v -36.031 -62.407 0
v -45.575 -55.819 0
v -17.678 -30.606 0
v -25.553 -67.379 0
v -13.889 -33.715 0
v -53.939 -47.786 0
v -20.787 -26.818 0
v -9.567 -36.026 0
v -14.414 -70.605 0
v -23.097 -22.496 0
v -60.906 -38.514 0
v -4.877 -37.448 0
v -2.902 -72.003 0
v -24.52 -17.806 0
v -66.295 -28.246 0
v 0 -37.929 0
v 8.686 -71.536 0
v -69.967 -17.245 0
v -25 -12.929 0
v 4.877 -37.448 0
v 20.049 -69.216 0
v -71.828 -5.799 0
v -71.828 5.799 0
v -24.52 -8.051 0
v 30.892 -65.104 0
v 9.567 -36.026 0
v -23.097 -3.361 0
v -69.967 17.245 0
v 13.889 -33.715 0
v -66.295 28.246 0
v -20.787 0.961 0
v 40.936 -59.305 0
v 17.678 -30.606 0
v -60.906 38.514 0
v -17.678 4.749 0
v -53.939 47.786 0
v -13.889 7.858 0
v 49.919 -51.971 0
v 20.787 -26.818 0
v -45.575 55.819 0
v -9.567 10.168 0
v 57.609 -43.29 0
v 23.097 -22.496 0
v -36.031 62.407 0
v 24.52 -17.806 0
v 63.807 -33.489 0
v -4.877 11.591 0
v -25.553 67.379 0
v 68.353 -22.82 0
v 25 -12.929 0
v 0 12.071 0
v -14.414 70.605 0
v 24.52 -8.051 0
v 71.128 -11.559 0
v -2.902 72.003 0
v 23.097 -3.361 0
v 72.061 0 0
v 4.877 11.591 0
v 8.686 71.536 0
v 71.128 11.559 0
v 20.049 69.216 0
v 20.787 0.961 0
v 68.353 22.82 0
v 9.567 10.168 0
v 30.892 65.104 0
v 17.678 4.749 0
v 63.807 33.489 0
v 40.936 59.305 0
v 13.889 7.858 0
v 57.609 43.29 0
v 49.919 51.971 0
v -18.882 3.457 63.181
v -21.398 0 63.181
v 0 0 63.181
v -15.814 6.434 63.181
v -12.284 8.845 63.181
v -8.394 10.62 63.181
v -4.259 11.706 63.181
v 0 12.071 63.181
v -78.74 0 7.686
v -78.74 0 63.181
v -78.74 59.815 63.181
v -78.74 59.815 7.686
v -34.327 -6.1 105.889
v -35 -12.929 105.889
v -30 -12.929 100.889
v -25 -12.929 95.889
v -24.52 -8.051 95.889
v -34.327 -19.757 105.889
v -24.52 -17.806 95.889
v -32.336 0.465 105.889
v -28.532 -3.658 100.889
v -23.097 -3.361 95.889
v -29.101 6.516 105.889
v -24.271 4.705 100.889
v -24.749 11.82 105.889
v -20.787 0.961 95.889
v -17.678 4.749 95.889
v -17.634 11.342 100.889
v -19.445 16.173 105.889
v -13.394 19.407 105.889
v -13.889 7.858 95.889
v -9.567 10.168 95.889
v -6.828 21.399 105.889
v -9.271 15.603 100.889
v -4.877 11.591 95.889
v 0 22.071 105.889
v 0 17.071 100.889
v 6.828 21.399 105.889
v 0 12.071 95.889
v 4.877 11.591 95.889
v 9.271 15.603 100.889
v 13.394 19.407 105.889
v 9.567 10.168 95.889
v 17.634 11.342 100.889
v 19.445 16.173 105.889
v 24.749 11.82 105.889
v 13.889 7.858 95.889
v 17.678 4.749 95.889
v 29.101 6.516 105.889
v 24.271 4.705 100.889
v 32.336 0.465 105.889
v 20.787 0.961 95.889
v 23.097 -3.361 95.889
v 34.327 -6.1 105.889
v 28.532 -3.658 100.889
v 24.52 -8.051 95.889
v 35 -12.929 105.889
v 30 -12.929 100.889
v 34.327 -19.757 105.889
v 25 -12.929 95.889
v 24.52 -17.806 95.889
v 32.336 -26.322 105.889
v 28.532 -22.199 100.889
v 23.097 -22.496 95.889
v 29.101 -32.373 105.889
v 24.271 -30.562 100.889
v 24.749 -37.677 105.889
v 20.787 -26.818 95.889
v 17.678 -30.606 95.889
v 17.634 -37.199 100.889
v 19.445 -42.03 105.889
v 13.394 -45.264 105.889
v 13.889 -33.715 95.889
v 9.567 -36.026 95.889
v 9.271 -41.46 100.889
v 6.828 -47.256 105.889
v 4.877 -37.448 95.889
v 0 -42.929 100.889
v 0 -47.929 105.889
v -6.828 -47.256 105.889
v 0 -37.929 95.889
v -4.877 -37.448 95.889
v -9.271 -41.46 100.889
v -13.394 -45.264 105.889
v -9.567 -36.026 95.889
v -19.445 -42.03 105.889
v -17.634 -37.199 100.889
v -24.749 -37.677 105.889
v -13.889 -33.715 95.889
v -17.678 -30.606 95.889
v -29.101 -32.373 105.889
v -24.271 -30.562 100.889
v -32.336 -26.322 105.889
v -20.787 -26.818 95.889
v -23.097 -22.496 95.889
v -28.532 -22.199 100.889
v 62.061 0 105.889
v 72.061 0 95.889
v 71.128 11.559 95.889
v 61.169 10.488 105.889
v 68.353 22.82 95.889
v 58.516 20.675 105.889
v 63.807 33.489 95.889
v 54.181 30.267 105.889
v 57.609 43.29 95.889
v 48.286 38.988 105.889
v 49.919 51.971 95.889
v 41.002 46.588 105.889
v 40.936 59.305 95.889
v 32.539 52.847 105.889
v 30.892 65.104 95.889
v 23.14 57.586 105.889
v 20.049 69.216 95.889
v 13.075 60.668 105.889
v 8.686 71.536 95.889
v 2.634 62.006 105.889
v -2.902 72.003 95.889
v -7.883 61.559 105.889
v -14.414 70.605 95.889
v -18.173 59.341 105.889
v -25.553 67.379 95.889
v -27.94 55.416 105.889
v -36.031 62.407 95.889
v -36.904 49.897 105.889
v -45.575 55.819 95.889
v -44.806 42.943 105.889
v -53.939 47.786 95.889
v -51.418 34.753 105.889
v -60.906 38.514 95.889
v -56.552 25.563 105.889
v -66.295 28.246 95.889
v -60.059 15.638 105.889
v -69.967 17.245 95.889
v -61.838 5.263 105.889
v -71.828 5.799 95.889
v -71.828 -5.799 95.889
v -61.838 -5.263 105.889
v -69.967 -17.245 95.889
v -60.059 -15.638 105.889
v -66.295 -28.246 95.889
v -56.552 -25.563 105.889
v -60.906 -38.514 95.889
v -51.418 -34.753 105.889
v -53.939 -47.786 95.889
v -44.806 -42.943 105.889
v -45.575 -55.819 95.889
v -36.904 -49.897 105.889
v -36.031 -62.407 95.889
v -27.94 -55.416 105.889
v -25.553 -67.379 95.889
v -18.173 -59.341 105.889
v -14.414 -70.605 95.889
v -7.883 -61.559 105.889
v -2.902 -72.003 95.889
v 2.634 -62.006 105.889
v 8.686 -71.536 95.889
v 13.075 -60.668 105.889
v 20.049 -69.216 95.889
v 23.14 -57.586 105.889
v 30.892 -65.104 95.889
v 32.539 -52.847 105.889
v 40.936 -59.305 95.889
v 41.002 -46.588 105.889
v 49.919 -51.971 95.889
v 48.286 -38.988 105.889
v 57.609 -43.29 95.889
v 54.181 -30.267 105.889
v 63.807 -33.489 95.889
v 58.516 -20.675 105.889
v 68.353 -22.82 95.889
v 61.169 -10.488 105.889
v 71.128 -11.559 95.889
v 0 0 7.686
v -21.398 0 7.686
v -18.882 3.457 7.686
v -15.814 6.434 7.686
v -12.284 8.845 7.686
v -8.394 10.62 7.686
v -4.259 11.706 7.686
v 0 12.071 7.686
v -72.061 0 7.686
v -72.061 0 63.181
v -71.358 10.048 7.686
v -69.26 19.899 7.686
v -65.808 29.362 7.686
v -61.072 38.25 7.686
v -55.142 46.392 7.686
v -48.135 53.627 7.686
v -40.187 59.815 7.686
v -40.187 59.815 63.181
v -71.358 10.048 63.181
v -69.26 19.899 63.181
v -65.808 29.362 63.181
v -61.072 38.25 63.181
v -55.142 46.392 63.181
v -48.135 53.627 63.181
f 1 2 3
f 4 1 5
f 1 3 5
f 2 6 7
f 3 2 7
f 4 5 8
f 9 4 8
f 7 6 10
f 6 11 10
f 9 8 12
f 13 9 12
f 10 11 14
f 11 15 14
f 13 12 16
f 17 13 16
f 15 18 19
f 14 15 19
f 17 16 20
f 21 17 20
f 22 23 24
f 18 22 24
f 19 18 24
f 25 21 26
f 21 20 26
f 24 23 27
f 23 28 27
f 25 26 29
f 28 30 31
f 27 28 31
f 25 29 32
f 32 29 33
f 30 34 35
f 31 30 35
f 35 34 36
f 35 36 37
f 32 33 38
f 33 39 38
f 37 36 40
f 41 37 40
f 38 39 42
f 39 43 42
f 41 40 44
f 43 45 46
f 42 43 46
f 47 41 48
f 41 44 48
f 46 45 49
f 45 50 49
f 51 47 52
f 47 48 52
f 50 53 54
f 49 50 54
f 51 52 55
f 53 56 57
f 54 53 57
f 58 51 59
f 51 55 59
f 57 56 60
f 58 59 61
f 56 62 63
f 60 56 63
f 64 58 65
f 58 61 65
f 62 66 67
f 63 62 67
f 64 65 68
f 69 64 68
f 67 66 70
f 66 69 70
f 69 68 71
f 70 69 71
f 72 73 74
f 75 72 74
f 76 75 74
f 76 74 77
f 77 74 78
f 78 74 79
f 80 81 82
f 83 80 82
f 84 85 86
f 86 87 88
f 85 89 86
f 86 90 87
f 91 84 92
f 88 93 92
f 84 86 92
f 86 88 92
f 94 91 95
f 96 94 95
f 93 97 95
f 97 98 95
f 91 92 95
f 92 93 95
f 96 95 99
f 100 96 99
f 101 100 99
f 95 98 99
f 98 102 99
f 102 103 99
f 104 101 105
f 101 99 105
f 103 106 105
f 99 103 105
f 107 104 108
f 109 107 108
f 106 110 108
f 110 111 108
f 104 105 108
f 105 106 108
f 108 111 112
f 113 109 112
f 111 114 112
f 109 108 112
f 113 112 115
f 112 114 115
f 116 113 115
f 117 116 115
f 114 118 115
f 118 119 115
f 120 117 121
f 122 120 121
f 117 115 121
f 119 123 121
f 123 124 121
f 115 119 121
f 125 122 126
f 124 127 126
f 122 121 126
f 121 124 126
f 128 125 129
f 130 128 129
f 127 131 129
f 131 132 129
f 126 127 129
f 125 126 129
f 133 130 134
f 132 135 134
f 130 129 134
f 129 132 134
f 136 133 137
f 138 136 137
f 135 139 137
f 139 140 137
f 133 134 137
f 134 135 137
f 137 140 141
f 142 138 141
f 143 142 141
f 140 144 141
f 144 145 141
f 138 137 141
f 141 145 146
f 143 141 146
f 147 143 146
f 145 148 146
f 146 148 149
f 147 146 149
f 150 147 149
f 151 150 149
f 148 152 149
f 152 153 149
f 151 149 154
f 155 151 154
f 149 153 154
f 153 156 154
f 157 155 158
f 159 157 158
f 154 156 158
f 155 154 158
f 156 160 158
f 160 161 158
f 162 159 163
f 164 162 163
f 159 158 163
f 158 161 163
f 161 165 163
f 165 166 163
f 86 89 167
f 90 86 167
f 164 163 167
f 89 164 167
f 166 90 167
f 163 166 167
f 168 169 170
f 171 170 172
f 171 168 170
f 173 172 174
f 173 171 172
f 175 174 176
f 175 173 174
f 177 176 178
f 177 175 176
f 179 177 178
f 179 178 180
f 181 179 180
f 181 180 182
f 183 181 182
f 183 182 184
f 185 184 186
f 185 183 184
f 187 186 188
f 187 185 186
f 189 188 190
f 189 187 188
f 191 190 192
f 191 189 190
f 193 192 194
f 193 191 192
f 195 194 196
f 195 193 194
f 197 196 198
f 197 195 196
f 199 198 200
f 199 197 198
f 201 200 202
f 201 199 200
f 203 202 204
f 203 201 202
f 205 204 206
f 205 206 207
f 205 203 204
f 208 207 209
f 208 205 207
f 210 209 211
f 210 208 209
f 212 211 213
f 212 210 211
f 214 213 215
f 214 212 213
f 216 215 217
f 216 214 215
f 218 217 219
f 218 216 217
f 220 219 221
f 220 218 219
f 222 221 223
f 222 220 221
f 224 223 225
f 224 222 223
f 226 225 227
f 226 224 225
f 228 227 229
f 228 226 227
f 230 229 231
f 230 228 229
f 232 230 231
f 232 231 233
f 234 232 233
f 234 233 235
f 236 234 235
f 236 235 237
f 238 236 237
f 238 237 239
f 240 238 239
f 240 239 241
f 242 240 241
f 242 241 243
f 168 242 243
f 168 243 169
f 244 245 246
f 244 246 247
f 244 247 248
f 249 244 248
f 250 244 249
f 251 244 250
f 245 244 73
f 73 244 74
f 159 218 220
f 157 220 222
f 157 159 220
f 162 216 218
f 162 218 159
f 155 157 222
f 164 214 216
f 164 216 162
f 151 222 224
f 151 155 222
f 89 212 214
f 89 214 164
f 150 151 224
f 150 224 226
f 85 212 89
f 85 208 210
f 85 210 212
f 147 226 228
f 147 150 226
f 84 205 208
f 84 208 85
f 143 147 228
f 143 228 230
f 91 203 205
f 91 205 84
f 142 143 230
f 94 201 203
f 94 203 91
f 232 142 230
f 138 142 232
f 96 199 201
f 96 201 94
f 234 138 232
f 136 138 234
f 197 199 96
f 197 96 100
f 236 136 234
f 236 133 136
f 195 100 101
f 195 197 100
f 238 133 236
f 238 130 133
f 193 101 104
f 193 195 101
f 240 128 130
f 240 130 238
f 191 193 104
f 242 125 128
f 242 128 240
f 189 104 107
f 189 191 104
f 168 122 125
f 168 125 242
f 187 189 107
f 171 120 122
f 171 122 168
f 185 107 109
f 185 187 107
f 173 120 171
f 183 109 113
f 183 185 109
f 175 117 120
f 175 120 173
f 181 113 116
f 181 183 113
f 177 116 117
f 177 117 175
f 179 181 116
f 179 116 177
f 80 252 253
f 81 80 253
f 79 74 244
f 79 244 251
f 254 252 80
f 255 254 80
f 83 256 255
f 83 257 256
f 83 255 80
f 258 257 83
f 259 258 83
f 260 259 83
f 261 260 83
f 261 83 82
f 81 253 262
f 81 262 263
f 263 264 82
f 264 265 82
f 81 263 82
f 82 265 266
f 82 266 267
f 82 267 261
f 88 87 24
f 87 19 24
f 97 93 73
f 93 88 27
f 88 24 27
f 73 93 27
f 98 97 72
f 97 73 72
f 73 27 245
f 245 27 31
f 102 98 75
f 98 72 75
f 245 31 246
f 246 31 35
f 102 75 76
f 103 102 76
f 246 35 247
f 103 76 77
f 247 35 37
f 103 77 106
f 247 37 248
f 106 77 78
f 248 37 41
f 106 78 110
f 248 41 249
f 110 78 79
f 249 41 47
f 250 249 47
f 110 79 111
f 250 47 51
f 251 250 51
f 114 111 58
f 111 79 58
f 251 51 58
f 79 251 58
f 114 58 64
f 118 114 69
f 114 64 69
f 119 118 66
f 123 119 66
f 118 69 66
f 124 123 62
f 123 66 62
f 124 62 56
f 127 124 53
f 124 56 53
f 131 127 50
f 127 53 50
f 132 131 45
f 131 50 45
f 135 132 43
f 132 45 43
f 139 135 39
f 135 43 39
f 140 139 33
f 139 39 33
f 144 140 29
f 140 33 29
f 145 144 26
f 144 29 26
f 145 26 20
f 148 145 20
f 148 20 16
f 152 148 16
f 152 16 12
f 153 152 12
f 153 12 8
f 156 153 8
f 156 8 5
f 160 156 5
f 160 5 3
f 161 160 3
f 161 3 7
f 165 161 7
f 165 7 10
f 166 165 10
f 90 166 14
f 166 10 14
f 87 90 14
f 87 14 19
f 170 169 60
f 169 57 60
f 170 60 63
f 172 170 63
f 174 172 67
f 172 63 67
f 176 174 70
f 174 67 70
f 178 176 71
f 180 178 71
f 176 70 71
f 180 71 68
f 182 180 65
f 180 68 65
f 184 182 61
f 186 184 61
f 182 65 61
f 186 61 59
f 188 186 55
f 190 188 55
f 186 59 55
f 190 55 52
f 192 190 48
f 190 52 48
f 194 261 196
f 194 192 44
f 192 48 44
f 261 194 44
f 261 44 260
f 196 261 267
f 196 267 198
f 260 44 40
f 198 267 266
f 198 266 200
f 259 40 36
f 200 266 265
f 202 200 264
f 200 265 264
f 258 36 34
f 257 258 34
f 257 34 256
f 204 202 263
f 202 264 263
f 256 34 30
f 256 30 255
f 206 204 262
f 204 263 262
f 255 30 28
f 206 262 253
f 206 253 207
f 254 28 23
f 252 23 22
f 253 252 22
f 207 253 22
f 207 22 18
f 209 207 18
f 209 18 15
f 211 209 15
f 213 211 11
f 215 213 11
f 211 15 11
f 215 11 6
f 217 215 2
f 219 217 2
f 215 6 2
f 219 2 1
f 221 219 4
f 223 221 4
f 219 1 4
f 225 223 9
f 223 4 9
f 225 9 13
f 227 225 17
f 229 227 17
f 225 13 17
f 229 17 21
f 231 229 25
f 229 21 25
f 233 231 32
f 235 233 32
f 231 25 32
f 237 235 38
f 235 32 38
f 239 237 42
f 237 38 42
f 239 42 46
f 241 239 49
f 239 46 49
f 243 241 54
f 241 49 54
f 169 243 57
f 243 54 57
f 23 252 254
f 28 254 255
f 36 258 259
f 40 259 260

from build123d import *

# Parameters (mm, degrees)
F0_R     = 72.0614296005
F1_DEPTH = 105.8891117573
F3_D     = 50
F4_SIZE  = 10
F5_W     = 59.8151311278
F5_H     = 55.4952472448
F6_DEPTH = 78.7402912974


with BuildPart() as f1:
    # F0 (on Top) → F1 (new body)
    with BuildSketch(Plane.XY):
        Circle(F0_R)
    extrude(amount=F1_DEPTH)

    # F3 (through all)
    with Locations(Plane.XY.offset(105.8891117573)):
        with Locations((0, -12.928519398)):
            Hole(F3_D / 2)

    # F4
    f4_edges = [f1.edges().sort_by_distance(p)[0] for p in [
        (-72.06143, 0, 105.889112),
        (-25, -12.928519, 105.889112),
    ]]
    chamfer(f4_edges, length=F4_SIZE)

    # F5 (on Right) → F6 (join)
    with BuildSketch(Plane.YZ):
        with Locations((29.9075655639, 35.4334488511)):
            Rectangle(F5_W, F5_H)
    extrude(amount=-F6_DEPTH)


solid = f1.part
